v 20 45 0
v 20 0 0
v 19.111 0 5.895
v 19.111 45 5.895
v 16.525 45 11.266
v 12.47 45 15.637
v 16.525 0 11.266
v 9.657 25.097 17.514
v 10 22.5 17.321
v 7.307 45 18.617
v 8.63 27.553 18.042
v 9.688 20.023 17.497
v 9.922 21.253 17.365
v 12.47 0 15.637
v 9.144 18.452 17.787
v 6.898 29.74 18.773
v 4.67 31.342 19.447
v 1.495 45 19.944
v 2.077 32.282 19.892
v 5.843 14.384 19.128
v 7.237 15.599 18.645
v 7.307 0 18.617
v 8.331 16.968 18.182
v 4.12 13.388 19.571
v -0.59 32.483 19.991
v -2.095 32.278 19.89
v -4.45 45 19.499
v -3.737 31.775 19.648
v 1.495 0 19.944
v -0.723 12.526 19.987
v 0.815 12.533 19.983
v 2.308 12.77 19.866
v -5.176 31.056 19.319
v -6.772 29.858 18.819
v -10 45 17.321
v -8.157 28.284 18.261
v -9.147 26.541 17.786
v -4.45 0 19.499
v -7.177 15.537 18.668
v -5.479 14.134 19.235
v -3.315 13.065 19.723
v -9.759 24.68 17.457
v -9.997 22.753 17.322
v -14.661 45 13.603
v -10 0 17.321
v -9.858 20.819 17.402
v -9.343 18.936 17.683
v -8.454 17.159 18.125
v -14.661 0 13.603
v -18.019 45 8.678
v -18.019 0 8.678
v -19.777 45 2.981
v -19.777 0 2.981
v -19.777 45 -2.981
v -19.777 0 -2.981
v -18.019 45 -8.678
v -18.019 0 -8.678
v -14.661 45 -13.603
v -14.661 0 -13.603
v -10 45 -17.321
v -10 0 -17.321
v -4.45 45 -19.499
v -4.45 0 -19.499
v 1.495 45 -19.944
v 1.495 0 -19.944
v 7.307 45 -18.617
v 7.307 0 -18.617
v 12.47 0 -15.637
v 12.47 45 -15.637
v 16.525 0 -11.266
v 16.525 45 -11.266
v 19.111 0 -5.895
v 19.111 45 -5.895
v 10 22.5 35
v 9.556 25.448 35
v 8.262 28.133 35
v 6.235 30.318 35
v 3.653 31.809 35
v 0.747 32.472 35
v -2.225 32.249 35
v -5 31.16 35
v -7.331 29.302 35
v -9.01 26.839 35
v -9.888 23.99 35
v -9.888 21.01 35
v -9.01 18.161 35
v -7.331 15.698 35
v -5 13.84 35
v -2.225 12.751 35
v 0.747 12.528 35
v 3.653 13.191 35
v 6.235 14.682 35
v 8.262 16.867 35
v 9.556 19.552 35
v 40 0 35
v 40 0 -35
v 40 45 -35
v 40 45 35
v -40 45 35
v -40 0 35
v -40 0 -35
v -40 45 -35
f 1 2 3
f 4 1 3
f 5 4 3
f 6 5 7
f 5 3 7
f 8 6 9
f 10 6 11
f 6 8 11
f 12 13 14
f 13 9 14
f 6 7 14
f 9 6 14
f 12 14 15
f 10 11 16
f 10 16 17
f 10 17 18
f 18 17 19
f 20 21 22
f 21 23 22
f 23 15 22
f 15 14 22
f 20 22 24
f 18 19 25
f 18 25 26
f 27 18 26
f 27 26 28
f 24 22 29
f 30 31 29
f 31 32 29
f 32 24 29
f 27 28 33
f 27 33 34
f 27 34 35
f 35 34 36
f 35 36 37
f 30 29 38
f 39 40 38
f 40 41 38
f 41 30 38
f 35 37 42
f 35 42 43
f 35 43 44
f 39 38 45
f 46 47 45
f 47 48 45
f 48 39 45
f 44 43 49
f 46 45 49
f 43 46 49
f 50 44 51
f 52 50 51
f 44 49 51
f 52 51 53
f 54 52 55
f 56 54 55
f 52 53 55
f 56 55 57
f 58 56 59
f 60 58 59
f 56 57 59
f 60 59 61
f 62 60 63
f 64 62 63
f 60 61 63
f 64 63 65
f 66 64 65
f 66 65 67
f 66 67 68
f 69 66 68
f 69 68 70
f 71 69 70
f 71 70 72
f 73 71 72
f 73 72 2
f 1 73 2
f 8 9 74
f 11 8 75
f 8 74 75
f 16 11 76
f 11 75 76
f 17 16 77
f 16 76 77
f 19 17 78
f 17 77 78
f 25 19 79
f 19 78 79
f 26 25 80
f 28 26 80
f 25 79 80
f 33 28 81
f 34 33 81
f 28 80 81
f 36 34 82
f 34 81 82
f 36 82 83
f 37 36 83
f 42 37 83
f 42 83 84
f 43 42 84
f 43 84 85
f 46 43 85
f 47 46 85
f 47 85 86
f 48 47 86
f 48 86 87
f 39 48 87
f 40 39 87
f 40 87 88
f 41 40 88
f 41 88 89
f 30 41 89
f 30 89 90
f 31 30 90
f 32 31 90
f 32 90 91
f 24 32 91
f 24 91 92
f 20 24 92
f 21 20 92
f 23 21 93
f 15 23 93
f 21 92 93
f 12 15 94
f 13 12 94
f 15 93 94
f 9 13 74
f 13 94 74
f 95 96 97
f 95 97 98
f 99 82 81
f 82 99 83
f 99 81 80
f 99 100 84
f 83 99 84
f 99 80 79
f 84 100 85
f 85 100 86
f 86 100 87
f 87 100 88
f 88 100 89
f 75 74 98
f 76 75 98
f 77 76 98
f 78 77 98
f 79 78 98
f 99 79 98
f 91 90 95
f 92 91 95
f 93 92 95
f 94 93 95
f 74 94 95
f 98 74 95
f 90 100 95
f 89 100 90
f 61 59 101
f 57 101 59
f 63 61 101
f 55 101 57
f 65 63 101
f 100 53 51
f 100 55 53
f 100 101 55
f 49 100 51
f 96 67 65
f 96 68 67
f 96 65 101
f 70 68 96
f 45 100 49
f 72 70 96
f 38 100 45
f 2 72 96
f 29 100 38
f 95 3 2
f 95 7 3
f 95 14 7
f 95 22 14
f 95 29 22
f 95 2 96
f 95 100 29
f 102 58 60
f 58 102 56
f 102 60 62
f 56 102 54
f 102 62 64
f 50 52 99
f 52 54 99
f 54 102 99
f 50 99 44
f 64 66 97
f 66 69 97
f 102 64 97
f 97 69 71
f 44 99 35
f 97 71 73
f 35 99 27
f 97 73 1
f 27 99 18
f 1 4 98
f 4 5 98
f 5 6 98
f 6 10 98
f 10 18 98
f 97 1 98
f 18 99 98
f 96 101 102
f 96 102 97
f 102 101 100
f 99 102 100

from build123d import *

# Parameters (mm, degrees)
F0_W     = 80
F0_H     = 70
F1_DEPTH = 45
F2_R     = 20
F3_DEPTH = 45.001
F4_R     = 10
F5_DEPTH = 25


with BuildPart() as f1:
    # F0 (on Front) → F1 (new body)
    with BuildSketch(Plane.XZ):
        Rectangle(F0_W, F0_H)
    extrude(amount=-F1_DEPTH)

    # F2 (on face) → F3 (cut, through all)
    with BuildSketch(Plane.XZ):
        Circle(F2_R)
    extrude(amount=-F3_DEPTH, mode=Mode.SUBTRACT)

    # F4 (on face) → F5 (cut)
    with BuildSketch(Plane.XY.offset(35)):
        with Locations((0, 22.5)):
            Circle(F4_R)
    extrude(amount=-F5_DEPTH, mode=Mode.SUBTRACT)


solid = f1.part
